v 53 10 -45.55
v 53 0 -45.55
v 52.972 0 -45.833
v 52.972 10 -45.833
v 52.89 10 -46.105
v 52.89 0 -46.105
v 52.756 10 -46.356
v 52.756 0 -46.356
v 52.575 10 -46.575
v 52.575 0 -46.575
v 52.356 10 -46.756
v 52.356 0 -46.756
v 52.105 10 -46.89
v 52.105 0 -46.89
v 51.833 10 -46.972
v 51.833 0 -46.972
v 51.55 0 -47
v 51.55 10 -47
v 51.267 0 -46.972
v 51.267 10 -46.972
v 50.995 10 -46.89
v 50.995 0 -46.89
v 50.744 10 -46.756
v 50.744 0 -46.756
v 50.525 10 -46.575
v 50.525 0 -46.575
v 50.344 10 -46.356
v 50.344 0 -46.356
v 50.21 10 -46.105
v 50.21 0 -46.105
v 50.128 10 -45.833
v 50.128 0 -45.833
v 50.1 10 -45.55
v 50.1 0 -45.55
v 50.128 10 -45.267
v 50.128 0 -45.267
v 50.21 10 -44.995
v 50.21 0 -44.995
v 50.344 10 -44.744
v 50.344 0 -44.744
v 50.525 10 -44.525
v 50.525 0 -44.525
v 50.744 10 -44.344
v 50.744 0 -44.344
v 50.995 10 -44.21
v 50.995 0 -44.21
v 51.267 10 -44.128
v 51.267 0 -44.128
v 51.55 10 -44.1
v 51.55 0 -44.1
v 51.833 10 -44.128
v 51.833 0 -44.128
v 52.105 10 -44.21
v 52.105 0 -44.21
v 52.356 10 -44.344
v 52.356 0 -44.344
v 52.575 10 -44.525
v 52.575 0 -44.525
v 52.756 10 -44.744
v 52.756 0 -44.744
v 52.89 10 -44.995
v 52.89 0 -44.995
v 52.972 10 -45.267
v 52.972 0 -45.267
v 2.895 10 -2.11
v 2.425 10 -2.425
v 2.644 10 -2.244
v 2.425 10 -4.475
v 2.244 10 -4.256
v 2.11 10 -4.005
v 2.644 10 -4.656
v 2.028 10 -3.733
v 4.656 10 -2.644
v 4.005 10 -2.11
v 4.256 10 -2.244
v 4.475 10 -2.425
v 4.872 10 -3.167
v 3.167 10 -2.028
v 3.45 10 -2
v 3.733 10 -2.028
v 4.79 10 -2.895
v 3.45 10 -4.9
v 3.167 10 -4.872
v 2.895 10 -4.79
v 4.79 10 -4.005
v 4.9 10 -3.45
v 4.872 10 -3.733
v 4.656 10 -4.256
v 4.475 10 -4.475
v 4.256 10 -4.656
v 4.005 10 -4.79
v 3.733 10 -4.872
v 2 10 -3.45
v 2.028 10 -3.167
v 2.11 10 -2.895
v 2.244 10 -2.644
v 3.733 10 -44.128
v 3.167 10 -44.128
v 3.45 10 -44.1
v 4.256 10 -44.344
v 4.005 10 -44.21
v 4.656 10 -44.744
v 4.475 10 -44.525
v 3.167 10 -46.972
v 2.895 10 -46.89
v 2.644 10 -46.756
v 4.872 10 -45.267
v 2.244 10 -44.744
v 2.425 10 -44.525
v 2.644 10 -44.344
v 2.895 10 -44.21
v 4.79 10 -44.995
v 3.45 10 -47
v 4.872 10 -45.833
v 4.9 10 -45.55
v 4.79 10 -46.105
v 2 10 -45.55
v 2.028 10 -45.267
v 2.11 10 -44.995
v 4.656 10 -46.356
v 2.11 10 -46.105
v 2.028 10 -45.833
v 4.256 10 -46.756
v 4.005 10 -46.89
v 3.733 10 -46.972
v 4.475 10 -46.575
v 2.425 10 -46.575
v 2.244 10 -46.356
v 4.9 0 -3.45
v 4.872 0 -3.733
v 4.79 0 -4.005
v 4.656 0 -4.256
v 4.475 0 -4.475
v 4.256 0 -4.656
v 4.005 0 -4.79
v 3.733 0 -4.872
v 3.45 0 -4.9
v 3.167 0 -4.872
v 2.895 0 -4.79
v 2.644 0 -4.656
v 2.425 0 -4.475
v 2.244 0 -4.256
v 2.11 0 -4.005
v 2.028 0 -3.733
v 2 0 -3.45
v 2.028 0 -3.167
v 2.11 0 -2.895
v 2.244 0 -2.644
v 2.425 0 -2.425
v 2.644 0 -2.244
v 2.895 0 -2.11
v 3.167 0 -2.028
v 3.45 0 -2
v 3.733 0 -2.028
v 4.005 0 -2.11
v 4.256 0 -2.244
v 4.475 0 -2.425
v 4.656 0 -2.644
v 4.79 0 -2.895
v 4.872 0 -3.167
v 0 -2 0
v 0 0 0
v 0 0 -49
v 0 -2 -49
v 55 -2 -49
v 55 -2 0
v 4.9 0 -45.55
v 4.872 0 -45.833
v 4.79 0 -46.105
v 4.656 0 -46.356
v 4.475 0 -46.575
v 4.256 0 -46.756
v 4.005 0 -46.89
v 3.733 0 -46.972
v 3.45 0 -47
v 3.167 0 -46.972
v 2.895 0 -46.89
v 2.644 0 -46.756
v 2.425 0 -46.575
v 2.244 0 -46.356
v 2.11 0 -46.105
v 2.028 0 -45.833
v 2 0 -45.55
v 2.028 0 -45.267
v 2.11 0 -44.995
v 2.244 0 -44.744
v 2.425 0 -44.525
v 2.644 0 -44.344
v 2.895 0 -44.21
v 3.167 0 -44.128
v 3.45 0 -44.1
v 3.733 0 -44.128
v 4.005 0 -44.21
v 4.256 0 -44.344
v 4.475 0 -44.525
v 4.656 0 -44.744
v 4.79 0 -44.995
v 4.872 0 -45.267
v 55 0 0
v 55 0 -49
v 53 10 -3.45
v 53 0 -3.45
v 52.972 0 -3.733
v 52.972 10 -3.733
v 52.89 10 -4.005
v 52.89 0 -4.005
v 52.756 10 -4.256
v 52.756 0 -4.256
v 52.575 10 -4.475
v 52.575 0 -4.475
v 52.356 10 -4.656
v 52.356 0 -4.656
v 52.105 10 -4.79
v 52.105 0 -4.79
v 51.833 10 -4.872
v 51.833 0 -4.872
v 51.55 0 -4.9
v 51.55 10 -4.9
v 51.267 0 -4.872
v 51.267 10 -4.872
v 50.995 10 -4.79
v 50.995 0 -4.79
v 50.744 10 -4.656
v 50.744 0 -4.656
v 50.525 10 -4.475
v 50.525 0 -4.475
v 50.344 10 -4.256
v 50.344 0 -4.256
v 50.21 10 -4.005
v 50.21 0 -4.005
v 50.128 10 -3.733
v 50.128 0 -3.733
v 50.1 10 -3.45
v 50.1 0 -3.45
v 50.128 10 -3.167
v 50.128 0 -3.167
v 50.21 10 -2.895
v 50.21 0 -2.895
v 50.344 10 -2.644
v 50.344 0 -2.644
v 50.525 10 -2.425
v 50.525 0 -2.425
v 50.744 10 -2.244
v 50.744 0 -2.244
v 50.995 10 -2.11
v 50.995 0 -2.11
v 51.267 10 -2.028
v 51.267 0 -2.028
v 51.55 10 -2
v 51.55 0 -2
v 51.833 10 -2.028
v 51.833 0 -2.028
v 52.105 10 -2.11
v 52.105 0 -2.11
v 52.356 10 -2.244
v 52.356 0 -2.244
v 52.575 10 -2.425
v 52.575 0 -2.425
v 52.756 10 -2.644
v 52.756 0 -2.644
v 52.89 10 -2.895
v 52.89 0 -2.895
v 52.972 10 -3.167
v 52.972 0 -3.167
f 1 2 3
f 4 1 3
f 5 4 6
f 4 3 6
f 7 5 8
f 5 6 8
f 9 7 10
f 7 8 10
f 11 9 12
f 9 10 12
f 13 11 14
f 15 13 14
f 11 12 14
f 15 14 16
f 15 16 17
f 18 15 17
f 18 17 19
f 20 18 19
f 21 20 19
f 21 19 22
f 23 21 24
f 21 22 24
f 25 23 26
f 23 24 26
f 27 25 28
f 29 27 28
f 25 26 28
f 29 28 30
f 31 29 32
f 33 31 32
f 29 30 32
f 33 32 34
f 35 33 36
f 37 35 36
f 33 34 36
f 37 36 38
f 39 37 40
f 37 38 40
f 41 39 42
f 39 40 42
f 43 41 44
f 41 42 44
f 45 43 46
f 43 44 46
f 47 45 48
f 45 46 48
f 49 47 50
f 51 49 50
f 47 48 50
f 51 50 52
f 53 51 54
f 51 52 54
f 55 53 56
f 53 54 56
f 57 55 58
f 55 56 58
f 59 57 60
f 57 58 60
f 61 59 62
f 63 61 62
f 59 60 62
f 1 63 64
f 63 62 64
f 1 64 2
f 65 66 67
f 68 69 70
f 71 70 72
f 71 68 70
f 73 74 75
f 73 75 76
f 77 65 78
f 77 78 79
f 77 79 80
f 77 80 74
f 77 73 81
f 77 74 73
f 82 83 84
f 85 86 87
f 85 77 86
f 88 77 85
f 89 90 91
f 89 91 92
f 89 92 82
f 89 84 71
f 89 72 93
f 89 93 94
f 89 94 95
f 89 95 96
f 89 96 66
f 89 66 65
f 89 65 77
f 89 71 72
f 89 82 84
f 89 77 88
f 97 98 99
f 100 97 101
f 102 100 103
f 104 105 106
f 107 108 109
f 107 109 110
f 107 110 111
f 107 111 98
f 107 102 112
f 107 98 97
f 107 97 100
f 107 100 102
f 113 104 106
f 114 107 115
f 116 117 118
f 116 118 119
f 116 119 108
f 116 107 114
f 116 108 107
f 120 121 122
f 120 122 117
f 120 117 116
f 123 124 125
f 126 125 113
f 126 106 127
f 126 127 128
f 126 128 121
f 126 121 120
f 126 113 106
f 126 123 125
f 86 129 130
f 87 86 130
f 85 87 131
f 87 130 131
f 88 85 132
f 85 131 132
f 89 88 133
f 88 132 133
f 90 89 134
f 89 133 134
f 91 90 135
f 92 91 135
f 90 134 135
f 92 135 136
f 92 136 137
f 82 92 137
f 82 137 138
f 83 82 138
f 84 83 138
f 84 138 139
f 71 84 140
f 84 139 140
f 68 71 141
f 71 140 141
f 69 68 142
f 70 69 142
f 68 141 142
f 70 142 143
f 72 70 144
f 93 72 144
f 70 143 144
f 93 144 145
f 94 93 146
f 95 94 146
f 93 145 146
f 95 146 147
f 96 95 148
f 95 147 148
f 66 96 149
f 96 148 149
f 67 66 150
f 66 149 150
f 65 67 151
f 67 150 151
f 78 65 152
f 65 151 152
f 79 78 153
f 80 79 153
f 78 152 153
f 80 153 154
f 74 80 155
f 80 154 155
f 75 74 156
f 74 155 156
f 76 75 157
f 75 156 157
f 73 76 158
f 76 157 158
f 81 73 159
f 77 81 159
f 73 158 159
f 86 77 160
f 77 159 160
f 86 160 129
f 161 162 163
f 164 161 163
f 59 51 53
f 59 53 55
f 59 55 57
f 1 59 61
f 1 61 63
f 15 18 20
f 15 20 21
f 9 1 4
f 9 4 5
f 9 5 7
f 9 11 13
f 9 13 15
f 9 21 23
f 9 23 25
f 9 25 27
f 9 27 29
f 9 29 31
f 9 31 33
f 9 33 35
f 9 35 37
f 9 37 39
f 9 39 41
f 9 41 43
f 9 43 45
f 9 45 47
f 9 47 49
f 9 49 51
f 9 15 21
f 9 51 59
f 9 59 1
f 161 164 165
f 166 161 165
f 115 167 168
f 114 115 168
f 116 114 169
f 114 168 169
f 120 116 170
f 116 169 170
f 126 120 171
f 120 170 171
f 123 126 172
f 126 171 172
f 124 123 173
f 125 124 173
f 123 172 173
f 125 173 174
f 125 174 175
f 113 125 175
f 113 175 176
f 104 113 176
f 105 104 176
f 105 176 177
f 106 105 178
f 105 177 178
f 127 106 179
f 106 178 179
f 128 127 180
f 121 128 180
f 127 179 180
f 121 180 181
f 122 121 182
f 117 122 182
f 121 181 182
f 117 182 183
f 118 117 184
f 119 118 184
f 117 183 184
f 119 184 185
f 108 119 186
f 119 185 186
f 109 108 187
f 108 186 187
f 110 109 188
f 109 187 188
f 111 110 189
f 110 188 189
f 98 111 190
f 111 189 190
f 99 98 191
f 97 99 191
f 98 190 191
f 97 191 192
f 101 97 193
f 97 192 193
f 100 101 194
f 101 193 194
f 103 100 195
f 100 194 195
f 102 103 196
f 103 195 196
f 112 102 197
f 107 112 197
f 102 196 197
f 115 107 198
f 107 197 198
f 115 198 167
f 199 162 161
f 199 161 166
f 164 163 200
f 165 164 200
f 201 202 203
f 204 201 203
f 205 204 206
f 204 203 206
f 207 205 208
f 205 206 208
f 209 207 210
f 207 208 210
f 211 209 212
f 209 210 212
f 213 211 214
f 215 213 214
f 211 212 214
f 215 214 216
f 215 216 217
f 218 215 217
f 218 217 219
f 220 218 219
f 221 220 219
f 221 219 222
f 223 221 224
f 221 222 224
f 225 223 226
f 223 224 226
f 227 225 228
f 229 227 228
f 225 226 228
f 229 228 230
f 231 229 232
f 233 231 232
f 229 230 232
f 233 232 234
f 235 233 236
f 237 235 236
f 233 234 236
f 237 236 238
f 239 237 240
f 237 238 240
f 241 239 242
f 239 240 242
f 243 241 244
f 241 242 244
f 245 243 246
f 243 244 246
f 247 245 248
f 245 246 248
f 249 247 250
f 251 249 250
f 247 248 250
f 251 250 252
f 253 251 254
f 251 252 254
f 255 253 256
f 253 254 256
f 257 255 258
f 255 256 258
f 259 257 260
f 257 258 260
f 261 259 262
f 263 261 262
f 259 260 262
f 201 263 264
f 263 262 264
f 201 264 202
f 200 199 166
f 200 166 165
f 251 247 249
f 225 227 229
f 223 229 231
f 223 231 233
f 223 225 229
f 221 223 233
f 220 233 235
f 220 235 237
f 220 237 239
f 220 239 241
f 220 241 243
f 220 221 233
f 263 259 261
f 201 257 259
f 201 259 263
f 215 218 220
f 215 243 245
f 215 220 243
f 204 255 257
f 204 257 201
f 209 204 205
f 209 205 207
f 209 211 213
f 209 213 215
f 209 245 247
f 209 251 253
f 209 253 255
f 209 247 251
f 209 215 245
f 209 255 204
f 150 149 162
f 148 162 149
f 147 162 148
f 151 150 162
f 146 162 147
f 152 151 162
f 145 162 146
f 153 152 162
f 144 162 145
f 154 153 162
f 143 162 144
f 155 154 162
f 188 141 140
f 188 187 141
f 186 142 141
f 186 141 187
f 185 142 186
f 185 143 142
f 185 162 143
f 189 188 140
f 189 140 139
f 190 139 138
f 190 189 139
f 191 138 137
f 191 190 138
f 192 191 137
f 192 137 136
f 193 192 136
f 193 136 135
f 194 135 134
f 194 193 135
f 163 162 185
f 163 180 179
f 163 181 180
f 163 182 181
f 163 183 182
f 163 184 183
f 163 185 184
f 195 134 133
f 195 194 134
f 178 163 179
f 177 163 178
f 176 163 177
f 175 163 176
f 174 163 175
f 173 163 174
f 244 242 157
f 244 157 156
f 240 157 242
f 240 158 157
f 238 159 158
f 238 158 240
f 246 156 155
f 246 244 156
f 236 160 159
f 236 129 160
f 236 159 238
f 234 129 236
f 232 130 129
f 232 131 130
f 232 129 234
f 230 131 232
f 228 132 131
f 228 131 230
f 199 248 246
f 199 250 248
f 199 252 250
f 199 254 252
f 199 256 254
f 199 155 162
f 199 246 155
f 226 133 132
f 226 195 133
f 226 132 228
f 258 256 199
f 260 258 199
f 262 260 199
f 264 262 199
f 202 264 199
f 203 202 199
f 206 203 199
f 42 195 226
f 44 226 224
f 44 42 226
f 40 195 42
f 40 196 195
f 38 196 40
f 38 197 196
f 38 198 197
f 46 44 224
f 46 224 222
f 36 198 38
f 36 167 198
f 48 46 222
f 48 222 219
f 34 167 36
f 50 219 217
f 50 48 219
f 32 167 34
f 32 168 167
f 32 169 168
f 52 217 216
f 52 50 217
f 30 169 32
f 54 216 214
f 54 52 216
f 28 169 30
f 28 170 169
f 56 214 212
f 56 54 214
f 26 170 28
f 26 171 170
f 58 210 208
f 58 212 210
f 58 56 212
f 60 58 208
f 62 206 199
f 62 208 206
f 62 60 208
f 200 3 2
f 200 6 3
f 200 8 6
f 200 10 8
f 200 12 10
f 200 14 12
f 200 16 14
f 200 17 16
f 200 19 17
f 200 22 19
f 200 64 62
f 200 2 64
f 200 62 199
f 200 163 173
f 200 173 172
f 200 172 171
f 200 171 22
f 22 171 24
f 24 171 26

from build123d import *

# Parameters (mm, degrees)
SKETCH1_W           = 55
SKETCH1_H           = 49
BOSS_EXTRUDE1_DEPTH = 2
SKETCH2_R           = 1.45
BOSS_EXTRUDE2_DEPTH = 10


with BuildPart() as part:
    # Sketch1 → Boss-Extrude1 (new body)
    with BuildSketch(Plane(origin=(0, 0, 0), x_dir=(1, 0, 0), z_dir=(0, 1, 0))):
        with Locations((27.5, 24.5)):
            Rectangle(SKETCH1_W, SKETCH1_H)
    extrude(amount=-BOSS_EXTRUDE1_DEPTH)

    # Sketch2 → Boss-Extrude2 (add)
    with BuildSketch(Plane(origin=(0, 0, 0), x_dir=(1, 0, 0), z_dir=(0, 1, 0))):
        with Locations((3.45, 3.45)):
            Circle(SKETCH2_R)
        with Locations((51.550000042, 3.45)):
            Circle(SKETCH2_R)
        with Locations((51.550000042, 45.55)):
            Circle(SKETCH2_R)
        with Locations((3.45, 45.55)):
            Circle(SKETCH2_R)
    extrude(amount=BOSS_EXTRUDE2_DEPTH)


solid = part.part
